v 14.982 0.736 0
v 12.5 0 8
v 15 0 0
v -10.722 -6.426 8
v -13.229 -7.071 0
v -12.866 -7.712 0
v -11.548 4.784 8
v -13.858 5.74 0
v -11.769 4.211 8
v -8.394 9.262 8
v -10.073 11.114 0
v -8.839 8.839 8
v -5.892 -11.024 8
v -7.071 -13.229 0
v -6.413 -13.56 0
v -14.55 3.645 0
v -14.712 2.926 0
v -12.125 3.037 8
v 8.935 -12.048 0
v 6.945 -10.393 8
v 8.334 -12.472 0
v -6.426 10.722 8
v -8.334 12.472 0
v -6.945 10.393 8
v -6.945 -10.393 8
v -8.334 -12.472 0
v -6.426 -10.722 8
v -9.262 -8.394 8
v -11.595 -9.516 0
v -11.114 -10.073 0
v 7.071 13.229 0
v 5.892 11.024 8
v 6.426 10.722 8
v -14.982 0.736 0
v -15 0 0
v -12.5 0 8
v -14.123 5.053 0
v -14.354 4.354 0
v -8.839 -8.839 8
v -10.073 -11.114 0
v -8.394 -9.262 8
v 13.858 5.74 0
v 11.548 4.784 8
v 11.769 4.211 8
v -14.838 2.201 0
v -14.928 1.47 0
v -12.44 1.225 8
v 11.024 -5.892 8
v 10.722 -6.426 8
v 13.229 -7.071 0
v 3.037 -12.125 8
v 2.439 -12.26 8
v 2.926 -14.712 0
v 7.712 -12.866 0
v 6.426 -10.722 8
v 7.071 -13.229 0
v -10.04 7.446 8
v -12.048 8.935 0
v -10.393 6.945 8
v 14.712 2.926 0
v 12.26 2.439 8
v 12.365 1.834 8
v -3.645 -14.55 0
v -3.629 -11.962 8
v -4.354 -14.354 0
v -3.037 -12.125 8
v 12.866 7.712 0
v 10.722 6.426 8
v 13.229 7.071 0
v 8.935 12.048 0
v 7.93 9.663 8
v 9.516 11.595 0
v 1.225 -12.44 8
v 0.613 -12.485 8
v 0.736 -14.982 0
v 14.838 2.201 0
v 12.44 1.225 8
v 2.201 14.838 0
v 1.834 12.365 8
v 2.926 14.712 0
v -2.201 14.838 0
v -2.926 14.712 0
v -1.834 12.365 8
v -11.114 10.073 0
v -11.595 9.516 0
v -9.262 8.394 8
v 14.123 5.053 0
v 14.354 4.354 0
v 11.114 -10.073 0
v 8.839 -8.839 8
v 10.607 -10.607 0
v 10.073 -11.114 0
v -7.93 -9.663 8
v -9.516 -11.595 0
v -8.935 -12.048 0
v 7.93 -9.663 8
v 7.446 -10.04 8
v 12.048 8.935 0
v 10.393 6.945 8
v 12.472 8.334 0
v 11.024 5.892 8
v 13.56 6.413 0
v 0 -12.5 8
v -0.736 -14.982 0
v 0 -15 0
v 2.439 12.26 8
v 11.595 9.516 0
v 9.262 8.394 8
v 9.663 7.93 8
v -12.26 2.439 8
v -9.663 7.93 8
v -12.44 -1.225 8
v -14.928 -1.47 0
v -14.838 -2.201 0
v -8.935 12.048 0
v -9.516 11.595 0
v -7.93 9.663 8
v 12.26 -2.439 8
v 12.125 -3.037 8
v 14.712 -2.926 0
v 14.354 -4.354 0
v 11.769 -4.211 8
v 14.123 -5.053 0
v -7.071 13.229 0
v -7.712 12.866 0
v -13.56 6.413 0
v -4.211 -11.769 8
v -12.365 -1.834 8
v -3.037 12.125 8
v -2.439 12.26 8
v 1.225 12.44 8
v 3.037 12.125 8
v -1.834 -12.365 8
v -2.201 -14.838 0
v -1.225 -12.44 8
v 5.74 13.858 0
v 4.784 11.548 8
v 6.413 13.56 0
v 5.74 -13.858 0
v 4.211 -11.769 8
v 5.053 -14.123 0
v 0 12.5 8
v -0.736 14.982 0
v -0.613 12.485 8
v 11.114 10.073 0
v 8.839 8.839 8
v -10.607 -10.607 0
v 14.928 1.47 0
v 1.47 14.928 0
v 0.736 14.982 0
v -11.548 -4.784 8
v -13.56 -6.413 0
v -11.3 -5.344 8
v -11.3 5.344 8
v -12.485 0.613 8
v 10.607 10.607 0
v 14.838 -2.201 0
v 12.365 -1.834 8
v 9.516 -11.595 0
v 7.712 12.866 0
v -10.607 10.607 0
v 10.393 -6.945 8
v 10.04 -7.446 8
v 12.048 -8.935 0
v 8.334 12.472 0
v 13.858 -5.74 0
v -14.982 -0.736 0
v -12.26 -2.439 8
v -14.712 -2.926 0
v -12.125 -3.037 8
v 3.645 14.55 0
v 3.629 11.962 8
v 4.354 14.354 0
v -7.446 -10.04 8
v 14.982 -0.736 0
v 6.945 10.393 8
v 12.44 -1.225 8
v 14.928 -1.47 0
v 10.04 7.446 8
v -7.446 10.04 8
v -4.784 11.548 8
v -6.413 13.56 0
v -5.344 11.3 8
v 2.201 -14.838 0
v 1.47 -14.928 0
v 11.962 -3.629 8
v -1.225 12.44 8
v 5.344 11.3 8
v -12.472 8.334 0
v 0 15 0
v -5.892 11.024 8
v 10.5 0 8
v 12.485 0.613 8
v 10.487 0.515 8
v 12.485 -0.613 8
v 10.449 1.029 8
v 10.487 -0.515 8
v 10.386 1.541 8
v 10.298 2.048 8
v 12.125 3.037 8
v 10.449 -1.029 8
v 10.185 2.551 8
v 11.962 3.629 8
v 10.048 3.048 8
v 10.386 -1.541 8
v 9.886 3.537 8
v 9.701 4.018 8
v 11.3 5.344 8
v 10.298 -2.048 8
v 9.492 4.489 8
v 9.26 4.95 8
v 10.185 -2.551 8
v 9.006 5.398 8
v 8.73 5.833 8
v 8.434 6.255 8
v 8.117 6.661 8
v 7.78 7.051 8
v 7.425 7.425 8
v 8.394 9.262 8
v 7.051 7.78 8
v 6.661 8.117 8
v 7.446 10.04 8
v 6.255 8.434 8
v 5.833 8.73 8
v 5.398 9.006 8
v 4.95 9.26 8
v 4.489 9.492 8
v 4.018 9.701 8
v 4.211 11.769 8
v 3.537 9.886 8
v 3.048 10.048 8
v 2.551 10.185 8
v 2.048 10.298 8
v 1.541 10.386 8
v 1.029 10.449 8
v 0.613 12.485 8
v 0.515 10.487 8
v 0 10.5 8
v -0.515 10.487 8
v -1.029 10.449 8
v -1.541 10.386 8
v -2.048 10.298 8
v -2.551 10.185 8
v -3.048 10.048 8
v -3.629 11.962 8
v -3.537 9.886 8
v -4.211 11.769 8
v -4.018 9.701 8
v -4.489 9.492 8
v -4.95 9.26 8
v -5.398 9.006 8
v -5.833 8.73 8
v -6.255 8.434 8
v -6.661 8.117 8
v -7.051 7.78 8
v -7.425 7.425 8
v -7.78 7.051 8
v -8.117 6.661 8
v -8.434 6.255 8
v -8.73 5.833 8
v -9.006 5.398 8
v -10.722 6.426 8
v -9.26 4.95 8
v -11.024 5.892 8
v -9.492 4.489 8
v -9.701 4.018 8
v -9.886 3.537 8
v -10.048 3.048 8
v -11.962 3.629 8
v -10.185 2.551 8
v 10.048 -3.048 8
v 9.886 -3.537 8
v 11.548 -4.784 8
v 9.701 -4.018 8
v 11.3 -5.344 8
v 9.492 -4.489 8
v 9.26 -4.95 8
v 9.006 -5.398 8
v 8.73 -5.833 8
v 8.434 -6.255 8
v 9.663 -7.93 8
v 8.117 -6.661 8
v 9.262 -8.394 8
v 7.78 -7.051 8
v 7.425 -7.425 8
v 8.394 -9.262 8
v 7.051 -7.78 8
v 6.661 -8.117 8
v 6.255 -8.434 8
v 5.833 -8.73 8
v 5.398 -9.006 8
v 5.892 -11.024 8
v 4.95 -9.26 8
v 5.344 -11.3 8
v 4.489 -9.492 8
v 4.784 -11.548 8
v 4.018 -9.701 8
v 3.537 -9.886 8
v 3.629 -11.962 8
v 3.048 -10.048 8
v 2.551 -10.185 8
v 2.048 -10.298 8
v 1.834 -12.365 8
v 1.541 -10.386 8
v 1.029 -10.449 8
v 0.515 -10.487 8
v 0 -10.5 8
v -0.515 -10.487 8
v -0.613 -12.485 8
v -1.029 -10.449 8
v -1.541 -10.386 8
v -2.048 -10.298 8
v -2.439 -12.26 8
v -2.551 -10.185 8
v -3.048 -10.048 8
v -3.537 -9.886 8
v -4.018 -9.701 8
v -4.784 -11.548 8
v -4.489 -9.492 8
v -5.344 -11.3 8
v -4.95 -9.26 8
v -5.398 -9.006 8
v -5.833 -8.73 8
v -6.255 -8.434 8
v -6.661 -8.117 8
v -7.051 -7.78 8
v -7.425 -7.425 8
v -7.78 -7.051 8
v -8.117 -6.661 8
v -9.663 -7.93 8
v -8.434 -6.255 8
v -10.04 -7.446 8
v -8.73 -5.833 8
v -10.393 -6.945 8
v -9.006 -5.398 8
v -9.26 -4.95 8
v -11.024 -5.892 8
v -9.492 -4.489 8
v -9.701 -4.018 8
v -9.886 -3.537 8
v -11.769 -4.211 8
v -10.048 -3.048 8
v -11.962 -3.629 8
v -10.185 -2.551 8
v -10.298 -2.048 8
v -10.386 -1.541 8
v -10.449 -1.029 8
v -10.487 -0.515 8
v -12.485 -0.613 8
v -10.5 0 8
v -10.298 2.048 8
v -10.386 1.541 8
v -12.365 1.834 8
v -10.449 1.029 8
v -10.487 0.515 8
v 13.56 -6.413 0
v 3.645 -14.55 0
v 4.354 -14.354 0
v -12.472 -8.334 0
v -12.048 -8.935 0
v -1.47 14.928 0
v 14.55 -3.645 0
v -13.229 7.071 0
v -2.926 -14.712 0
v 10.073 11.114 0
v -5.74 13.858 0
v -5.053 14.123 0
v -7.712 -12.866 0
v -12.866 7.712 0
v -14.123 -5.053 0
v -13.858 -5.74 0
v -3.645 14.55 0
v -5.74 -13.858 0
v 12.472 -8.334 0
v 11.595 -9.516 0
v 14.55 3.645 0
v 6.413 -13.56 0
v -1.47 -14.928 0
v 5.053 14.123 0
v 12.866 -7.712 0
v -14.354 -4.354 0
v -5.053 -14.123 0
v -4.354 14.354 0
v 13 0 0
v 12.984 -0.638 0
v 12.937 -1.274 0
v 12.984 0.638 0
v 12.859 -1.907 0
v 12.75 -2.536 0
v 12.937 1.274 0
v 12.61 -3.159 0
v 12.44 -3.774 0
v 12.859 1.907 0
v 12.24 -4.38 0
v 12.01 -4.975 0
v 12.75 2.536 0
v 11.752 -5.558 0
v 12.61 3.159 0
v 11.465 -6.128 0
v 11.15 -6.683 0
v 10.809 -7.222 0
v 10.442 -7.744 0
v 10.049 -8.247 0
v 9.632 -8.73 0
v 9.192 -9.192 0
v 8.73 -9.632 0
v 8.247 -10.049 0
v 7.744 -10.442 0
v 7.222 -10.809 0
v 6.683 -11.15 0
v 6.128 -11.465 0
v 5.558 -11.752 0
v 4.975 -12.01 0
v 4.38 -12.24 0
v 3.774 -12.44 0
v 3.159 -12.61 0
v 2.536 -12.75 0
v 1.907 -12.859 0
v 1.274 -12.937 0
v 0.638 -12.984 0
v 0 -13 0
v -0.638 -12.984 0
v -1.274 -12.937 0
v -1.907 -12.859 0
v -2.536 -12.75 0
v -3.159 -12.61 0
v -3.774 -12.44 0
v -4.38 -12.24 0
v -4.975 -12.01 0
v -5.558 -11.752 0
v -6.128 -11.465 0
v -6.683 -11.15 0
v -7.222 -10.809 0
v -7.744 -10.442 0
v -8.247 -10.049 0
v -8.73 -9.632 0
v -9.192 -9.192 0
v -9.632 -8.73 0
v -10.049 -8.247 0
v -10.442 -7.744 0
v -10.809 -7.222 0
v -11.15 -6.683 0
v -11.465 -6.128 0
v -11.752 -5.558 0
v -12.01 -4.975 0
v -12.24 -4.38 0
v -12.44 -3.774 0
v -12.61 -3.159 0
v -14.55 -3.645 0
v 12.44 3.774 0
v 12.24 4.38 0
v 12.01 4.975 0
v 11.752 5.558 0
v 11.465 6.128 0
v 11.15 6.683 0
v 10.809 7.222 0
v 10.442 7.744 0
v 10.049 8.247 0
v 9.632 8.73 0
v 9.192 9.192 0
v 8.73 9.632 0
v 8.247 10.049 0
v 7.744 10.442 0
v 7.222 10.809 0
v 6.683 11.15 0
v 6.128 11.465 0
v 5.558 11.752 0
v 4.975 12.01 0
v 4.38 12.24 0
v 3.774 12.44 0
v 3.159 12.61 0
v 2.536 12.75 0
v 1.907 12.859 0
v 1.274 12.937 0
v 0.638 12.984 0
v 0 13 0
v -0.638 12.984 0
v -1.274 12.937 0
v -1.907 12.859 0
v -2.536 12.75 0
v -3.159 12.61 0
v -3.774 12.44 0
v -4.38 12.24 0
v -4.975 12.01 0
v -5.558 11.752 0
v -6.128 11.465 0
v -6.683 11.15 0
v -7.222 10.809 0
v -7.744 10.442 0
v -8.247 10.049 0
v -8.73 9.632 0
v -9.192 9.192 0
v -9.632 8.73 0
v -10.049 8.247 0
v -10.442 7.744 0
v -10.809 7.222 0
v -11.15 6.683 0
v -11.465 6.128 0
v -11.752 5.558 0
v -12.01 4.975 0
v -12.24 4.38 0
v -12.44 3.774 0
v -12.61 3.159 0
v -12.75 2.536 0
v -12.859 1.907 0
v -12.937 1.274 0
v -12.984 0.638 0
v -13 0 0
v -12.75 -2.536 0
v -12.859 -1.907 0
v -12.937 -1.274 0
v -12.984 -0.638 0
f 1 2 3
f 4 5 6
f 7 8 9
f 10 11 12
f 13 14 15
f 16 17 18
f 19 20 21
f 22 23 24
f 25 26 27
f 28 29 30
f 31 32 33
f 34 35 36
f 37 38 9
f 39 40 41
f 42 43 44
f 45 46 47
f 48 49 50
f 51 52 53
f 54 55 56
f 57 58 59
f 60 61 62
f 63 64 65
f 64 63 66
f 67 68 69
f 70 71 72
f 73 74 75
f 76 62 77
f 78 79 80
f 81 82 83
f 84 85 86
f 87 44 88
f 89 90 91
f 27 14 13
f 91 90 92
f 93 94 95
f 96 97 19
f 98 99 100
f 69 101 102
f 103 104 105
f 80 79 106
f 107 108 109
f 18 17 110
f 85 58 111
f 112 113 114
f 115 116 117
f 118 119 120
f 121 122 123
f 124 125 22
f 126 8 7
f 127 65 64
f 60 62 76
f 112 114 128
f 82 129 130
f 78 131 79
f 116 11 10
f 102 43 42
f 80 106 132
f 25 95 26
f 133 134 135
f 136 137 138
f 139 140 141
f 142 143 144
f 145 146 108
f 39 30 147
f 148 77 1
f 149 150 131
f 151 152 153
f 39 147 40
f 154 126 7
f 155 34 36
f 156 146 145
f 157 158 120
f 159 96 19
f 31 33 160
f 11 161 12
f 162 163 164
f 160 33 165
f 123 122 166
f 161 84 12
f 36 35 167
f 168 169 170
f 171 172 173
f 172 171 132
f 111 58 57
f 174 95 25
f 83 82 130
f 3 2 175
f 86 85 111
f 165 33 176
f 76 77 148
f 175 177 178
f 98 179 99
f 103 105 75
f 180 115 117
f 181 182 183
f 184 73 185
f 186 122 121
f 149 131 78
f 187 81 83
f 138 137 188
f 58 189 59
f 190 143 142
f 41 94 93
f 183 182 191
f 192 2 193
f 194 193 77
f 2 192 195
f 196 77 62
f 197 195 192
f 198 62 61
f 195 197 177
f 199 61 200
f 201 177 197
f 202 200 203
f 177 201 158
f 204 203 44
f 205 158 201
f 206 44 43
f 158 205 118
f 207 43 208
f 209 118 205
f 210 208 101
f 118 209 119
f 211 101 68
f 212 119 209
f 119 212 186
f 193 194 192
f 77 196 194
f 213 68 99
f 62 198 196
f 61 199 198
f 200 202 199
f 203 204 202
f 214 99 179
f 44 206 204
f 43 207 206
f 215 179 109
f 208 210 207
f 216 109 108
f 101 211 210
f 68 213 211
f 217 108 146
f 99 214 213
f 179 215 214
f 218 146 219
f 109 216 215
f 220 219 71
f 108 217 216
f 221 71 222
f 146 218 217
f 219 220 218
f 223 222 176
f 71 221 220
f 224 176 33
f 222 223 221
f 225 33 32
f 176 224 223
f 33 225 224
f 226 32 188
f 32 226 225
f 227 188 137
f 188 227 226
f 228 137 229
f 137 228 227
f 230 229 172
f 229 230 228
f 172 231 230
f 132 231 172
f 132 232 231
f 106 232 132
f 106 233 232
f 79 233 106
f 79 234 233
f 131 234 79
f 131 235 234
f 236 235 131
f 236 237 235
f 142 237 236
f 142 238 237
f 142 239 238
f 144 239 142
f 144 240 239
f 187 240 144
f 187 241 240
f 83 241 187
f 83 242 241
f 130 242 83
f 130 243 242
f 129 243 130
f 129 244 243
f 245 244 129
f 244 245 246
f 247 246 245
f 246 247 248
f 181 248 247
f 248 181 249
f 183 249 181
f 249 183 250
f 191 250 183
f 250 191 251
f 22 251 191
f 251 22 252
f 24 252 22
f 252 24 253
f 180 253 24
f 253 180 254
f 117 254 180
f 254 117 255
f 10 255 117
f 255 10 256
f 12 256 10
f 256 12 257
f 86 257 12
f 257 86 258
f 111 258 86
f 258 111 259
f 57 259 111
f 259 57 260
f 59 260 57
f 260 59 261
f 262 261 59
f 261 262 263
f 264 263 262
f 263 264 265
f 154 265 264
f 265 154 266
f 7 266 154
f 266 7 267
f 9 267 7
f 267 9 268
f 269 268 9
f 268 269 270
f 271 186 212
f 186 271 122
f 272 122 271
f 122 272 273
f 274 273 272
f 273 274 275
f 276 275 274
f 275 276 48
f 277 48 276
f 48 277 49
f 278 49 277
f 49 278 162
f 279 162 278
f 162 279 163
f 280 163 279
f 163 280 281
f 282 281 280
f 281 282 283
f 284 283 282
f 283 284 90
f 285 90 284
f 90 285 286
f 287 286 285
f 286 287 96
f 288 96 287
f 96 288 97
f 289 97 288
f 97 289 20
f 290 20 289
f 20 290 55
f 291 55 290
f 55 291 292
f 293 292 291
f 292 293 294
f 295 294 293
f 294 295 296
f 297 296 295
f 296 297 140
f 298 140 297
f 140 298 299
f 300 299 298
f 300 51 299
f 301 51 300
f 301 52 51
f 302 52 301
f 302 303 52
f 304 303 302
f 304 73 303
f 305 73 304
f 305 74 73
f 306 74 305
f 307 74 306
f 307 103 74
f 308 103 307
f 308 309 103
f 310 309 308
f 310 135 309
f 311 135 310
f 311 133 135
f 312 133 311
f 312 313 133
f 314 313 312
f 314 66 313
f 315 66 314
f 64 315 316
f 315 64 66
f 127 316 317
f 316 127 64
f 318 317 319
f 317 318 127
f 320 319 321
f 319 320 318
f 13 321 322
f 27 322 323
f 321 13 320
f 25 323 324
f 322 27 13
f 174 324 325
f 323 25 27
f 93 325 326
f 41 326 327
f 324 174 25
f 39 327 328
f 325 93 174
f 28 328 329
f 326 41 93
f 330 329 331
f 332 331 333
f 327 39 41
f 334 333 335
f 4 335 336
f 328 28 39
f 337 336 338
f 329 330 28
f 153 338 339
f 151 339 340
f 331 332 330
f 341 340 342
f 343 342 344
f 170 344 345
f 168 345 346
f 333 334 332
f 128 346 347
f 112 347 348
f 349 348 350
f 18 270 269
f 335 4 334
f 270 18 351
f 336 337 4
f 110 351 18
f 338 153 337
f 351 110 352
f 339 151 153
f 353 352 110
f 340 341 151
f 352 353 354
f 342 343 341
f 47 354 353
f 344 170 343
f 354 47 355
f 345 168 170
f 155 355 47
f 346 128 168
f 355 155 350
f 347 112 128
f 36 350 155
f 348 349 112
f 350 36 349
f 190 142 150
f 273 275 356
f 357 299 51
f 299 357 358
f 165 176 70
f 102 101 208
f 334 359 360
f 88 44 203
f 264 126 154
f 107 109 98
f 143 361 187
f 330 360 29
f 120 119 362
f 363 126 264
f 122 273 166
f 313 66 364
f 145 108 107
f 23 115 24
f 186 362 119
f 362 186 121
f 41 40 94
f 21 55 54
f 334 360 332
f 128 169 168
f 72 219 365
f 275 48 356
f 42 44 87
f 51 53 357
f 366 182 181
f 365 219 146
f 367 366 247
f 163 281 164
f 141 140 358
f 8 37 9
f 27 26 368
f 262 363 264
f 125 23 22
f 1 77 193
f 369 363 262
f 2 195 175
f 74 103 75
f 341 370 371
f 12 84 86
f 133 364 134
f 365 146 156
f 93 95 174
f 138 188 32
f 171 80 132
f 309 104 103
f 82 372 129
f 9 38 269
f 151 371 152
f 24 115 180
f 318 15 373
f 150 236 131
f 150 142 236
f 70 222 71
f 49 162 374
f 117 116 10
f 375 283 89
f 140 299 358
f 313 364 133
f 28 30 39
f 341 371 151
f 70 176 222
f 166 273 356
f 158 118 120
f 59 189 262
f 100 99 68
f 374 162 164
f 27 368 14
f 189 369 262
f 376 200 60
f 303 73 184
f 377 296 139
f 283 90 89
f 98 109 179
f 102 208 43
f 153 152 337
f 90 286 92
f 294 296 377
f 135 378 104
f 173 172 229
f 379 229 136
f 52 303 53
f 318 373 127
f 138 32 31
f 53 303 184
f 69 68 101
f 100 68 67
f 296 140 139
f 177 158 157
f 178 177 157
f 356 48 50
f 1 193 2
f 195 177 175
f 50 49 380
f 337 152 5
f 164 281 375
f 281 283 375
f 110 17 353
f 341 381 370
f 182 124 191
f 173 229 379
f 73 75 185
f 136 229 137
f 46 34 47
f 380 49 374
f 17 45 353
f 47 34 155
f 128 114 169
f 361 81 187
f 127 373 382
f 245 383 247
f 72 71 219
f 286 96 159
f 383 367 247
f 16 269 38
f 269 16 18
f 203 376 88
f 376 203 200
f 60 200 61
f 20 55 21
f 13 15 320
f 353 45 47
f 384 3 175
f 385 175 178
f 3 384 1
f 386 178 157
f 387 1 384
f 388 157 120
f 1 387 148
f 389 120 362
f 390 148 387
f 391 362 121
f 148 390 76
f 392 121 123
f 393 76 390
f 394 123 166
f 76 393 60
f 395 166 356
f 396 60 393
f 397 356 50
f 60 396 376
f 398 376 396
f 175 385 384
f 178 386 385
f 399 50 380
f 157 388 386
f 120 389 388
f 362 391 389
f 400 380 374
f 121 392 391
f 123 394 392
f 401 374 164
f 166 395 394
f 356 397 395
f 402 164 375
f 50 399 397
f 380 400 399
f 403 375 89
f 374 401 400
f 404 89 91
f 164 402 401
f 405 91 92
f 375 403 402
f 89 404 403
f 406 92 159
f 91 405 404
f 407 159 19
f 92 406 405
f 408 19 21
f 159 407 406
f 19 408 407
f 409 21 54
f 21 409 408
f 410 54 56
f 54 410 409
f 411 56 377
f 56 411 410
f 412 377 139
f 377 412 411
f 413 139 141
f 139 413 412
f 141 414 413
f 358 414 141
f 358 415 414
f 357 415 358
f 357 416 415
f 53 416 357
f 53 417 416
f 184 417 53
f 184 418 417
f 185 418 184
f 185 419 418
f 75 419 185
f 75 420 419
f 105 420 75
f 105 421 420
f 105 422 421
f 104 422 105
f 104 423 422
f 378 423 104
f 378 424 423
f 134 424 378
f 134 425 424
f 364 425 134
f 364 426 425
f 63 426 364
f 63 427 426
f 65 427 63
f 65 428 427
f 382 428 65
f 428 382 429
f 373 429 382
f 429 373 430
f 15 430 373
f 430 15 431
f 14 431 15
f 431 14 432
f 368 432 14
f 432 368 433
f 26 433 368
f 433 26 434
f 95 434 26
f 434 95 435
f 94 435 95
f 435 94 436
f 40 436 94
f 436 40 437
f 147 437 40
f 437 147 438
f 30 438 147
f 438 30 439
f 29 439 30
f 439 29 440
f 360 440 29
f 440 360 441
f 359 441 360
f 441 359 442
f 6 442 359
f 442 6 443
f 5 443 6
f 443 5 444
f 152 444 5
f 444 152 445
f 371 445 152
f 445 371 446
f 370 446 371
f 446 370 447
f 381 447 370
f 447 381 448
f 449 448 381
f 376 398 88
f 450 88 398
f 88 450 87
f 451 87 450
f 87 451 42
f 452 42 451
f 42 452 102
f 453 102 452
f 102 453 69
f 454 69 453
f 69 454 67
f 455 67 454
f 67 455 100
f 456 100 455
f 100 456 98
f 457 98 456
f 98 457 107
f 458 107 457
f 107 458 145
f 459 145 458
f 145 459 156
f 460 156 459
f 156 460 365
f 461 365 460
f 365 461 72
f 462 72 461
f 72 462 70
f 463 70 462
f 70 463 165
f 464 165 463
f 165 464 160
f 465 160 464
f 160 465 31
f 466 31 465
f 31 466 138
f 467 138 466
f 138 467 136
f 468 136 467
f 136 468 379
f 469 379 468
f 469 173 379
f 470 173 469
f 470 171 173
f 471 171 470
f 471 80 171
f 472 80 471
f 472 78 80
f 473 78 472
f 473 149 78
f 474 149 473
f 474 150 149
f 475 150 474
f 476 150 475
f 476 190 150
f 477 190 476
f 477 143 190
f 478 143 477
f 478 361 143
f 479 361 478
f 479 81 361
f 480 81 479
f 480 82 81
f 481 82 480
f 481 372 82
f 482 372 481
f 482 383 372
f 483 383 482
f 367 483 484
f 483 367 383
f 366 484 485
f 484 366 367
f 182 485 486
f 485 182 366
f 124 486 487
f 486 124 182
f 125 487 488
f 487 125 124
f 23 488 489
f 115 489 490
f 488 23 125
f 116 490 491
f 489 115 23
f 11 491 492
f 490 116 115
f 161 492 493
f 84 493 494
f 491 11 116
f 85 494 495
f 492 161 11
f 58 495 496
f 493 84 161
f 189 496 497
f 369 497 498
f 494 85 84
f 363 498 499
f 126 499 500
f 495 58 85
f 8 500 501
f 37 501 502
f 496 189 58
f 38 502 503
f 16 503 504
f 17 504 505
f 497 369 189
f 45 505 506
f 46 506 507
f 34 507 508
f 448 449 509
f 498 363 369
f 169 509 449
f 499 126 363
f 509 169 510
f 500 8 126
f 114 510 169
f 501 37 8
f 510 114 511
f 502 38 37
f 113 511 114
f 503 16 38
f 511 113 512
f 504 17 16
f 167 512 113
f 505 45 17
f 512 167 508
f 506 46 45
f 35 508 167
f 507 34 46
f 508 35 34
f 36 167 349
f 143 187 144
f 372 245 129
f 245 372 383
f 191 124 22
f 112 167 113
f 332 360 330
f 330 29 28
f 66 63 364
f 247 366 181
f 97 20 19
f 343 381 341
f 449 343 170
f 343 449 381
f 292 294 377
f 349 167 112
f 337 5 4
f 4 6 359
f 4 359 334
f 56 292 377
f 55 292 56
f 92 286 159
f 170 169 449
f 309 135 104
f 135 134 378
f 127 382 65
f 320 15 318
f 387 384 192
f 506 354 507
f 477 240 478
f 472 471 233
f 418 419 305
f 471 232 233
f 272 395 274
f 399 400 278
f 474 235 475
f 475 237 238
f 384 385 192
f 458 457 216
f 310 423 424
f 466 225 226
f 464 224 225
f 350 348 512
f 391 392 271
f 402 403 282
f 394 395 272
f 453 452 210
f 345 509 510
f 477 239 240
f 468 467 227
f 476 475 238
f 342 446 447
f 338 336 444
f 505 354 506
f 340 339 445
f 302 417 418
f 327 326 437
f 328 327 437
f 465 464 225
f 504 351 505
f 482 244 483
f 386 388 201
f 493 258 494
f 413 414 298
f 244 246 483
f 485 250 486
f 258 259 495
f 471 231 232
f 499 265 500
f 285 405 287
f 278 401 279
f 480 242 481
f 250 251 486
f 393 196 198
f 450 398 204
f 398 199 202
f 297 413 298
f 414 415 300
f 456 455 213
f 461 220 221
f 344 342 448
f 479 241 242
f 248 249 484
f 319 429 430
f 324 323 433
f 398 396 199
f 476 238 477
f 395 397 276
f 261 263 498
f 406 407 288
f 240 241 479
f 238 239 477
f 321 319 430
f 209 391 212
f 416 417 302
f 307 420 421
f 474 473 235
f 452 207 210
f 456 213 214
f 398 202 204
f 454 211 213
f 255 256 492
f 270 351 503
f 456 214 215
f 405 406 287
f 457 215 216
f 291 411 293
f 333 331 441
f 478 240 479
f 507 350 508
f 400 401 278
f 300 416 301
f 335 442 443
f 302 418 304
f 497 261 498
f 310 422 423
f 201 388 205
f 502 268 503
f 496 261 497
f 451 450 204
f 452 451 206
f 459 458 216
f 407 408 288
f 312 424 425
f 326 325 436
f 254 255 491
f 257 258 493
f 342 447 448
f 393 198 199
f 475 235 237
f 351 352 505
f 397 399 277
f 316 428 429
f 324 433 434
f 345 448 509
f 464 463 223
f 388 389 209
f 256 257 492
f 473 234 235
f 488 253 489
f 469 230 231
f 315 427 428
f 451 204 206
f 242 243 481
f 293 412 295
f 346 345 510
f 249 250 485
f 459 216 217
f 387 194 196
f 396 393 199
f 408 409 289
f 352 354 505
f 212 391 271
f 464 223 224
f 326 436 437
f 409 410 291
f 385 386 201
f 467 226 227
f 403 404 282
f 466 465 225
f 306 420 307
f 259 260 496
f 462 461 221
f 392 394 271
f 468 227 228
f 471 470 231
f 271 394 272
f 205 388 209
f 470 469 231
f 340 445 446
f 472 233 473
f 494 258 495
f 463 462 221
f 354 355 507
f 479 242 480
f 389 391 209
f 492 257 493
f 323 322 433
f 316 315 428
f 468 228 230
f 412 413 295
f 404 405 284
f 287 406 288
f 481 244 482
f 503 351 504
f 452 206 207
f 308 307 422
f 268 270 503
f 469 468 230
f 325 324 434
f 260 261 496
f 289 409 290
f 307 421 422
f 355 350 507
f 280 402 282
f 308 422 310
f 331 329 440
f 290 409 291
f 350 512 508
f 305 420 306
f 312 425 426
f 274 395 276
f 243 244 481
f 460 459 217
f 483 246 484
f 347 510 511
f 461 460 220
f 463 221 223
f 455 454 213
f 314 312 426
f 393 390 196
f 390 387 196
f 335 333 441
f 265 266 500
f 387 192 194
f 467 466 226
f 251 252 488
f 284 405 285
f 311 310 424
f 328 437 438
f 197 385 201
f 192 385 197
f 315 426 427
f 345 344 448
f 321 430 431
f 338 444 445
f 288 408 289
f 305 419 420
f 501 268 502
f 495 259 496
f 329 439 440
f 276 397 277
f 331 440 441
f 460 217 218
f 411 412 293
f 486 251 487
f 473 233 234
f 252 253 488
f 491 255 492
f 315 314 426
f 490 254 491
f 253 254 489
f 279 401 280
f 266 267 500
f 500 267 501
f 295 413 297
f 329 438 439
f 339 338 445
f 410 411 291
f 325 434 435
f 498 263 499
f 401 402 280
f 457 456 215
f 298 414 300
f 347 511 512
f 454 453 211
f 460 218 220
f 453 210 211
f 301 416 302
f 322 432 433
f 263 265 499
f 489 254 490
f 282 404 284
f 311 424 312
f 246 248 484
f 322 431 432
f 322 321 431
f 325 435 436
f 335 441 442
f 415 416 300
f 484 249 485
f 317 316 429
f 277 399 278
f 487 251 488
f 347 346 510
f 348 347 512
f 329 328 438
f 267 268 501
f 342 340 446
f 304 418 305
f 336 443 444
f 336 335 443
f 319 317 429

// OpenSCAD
// Pakning til Mia

$fn = $preview ? 32 : 128;

pakning_ytre_d_maks = 30;
pakning_ytre_d_min = 25;
pakning_tykkelse = 2;
pakning_bredde = 8;

hvit_innvendig = 25.3;
hvit_utvendig = 30;
hvit_tykkelse = 2.2;

difference() {
    cylinder(h=pakning_bredde, d1=pakning_ytre_d_maks, d2=pakning_ytre_d_min);
    cylinder(h=pakning_bredde, d1=pakning_ytre_d_maks-pakning_tykkelse*2, 
             d2=pakning_ytre_d_min-pakning_tykkelse*2);
}
